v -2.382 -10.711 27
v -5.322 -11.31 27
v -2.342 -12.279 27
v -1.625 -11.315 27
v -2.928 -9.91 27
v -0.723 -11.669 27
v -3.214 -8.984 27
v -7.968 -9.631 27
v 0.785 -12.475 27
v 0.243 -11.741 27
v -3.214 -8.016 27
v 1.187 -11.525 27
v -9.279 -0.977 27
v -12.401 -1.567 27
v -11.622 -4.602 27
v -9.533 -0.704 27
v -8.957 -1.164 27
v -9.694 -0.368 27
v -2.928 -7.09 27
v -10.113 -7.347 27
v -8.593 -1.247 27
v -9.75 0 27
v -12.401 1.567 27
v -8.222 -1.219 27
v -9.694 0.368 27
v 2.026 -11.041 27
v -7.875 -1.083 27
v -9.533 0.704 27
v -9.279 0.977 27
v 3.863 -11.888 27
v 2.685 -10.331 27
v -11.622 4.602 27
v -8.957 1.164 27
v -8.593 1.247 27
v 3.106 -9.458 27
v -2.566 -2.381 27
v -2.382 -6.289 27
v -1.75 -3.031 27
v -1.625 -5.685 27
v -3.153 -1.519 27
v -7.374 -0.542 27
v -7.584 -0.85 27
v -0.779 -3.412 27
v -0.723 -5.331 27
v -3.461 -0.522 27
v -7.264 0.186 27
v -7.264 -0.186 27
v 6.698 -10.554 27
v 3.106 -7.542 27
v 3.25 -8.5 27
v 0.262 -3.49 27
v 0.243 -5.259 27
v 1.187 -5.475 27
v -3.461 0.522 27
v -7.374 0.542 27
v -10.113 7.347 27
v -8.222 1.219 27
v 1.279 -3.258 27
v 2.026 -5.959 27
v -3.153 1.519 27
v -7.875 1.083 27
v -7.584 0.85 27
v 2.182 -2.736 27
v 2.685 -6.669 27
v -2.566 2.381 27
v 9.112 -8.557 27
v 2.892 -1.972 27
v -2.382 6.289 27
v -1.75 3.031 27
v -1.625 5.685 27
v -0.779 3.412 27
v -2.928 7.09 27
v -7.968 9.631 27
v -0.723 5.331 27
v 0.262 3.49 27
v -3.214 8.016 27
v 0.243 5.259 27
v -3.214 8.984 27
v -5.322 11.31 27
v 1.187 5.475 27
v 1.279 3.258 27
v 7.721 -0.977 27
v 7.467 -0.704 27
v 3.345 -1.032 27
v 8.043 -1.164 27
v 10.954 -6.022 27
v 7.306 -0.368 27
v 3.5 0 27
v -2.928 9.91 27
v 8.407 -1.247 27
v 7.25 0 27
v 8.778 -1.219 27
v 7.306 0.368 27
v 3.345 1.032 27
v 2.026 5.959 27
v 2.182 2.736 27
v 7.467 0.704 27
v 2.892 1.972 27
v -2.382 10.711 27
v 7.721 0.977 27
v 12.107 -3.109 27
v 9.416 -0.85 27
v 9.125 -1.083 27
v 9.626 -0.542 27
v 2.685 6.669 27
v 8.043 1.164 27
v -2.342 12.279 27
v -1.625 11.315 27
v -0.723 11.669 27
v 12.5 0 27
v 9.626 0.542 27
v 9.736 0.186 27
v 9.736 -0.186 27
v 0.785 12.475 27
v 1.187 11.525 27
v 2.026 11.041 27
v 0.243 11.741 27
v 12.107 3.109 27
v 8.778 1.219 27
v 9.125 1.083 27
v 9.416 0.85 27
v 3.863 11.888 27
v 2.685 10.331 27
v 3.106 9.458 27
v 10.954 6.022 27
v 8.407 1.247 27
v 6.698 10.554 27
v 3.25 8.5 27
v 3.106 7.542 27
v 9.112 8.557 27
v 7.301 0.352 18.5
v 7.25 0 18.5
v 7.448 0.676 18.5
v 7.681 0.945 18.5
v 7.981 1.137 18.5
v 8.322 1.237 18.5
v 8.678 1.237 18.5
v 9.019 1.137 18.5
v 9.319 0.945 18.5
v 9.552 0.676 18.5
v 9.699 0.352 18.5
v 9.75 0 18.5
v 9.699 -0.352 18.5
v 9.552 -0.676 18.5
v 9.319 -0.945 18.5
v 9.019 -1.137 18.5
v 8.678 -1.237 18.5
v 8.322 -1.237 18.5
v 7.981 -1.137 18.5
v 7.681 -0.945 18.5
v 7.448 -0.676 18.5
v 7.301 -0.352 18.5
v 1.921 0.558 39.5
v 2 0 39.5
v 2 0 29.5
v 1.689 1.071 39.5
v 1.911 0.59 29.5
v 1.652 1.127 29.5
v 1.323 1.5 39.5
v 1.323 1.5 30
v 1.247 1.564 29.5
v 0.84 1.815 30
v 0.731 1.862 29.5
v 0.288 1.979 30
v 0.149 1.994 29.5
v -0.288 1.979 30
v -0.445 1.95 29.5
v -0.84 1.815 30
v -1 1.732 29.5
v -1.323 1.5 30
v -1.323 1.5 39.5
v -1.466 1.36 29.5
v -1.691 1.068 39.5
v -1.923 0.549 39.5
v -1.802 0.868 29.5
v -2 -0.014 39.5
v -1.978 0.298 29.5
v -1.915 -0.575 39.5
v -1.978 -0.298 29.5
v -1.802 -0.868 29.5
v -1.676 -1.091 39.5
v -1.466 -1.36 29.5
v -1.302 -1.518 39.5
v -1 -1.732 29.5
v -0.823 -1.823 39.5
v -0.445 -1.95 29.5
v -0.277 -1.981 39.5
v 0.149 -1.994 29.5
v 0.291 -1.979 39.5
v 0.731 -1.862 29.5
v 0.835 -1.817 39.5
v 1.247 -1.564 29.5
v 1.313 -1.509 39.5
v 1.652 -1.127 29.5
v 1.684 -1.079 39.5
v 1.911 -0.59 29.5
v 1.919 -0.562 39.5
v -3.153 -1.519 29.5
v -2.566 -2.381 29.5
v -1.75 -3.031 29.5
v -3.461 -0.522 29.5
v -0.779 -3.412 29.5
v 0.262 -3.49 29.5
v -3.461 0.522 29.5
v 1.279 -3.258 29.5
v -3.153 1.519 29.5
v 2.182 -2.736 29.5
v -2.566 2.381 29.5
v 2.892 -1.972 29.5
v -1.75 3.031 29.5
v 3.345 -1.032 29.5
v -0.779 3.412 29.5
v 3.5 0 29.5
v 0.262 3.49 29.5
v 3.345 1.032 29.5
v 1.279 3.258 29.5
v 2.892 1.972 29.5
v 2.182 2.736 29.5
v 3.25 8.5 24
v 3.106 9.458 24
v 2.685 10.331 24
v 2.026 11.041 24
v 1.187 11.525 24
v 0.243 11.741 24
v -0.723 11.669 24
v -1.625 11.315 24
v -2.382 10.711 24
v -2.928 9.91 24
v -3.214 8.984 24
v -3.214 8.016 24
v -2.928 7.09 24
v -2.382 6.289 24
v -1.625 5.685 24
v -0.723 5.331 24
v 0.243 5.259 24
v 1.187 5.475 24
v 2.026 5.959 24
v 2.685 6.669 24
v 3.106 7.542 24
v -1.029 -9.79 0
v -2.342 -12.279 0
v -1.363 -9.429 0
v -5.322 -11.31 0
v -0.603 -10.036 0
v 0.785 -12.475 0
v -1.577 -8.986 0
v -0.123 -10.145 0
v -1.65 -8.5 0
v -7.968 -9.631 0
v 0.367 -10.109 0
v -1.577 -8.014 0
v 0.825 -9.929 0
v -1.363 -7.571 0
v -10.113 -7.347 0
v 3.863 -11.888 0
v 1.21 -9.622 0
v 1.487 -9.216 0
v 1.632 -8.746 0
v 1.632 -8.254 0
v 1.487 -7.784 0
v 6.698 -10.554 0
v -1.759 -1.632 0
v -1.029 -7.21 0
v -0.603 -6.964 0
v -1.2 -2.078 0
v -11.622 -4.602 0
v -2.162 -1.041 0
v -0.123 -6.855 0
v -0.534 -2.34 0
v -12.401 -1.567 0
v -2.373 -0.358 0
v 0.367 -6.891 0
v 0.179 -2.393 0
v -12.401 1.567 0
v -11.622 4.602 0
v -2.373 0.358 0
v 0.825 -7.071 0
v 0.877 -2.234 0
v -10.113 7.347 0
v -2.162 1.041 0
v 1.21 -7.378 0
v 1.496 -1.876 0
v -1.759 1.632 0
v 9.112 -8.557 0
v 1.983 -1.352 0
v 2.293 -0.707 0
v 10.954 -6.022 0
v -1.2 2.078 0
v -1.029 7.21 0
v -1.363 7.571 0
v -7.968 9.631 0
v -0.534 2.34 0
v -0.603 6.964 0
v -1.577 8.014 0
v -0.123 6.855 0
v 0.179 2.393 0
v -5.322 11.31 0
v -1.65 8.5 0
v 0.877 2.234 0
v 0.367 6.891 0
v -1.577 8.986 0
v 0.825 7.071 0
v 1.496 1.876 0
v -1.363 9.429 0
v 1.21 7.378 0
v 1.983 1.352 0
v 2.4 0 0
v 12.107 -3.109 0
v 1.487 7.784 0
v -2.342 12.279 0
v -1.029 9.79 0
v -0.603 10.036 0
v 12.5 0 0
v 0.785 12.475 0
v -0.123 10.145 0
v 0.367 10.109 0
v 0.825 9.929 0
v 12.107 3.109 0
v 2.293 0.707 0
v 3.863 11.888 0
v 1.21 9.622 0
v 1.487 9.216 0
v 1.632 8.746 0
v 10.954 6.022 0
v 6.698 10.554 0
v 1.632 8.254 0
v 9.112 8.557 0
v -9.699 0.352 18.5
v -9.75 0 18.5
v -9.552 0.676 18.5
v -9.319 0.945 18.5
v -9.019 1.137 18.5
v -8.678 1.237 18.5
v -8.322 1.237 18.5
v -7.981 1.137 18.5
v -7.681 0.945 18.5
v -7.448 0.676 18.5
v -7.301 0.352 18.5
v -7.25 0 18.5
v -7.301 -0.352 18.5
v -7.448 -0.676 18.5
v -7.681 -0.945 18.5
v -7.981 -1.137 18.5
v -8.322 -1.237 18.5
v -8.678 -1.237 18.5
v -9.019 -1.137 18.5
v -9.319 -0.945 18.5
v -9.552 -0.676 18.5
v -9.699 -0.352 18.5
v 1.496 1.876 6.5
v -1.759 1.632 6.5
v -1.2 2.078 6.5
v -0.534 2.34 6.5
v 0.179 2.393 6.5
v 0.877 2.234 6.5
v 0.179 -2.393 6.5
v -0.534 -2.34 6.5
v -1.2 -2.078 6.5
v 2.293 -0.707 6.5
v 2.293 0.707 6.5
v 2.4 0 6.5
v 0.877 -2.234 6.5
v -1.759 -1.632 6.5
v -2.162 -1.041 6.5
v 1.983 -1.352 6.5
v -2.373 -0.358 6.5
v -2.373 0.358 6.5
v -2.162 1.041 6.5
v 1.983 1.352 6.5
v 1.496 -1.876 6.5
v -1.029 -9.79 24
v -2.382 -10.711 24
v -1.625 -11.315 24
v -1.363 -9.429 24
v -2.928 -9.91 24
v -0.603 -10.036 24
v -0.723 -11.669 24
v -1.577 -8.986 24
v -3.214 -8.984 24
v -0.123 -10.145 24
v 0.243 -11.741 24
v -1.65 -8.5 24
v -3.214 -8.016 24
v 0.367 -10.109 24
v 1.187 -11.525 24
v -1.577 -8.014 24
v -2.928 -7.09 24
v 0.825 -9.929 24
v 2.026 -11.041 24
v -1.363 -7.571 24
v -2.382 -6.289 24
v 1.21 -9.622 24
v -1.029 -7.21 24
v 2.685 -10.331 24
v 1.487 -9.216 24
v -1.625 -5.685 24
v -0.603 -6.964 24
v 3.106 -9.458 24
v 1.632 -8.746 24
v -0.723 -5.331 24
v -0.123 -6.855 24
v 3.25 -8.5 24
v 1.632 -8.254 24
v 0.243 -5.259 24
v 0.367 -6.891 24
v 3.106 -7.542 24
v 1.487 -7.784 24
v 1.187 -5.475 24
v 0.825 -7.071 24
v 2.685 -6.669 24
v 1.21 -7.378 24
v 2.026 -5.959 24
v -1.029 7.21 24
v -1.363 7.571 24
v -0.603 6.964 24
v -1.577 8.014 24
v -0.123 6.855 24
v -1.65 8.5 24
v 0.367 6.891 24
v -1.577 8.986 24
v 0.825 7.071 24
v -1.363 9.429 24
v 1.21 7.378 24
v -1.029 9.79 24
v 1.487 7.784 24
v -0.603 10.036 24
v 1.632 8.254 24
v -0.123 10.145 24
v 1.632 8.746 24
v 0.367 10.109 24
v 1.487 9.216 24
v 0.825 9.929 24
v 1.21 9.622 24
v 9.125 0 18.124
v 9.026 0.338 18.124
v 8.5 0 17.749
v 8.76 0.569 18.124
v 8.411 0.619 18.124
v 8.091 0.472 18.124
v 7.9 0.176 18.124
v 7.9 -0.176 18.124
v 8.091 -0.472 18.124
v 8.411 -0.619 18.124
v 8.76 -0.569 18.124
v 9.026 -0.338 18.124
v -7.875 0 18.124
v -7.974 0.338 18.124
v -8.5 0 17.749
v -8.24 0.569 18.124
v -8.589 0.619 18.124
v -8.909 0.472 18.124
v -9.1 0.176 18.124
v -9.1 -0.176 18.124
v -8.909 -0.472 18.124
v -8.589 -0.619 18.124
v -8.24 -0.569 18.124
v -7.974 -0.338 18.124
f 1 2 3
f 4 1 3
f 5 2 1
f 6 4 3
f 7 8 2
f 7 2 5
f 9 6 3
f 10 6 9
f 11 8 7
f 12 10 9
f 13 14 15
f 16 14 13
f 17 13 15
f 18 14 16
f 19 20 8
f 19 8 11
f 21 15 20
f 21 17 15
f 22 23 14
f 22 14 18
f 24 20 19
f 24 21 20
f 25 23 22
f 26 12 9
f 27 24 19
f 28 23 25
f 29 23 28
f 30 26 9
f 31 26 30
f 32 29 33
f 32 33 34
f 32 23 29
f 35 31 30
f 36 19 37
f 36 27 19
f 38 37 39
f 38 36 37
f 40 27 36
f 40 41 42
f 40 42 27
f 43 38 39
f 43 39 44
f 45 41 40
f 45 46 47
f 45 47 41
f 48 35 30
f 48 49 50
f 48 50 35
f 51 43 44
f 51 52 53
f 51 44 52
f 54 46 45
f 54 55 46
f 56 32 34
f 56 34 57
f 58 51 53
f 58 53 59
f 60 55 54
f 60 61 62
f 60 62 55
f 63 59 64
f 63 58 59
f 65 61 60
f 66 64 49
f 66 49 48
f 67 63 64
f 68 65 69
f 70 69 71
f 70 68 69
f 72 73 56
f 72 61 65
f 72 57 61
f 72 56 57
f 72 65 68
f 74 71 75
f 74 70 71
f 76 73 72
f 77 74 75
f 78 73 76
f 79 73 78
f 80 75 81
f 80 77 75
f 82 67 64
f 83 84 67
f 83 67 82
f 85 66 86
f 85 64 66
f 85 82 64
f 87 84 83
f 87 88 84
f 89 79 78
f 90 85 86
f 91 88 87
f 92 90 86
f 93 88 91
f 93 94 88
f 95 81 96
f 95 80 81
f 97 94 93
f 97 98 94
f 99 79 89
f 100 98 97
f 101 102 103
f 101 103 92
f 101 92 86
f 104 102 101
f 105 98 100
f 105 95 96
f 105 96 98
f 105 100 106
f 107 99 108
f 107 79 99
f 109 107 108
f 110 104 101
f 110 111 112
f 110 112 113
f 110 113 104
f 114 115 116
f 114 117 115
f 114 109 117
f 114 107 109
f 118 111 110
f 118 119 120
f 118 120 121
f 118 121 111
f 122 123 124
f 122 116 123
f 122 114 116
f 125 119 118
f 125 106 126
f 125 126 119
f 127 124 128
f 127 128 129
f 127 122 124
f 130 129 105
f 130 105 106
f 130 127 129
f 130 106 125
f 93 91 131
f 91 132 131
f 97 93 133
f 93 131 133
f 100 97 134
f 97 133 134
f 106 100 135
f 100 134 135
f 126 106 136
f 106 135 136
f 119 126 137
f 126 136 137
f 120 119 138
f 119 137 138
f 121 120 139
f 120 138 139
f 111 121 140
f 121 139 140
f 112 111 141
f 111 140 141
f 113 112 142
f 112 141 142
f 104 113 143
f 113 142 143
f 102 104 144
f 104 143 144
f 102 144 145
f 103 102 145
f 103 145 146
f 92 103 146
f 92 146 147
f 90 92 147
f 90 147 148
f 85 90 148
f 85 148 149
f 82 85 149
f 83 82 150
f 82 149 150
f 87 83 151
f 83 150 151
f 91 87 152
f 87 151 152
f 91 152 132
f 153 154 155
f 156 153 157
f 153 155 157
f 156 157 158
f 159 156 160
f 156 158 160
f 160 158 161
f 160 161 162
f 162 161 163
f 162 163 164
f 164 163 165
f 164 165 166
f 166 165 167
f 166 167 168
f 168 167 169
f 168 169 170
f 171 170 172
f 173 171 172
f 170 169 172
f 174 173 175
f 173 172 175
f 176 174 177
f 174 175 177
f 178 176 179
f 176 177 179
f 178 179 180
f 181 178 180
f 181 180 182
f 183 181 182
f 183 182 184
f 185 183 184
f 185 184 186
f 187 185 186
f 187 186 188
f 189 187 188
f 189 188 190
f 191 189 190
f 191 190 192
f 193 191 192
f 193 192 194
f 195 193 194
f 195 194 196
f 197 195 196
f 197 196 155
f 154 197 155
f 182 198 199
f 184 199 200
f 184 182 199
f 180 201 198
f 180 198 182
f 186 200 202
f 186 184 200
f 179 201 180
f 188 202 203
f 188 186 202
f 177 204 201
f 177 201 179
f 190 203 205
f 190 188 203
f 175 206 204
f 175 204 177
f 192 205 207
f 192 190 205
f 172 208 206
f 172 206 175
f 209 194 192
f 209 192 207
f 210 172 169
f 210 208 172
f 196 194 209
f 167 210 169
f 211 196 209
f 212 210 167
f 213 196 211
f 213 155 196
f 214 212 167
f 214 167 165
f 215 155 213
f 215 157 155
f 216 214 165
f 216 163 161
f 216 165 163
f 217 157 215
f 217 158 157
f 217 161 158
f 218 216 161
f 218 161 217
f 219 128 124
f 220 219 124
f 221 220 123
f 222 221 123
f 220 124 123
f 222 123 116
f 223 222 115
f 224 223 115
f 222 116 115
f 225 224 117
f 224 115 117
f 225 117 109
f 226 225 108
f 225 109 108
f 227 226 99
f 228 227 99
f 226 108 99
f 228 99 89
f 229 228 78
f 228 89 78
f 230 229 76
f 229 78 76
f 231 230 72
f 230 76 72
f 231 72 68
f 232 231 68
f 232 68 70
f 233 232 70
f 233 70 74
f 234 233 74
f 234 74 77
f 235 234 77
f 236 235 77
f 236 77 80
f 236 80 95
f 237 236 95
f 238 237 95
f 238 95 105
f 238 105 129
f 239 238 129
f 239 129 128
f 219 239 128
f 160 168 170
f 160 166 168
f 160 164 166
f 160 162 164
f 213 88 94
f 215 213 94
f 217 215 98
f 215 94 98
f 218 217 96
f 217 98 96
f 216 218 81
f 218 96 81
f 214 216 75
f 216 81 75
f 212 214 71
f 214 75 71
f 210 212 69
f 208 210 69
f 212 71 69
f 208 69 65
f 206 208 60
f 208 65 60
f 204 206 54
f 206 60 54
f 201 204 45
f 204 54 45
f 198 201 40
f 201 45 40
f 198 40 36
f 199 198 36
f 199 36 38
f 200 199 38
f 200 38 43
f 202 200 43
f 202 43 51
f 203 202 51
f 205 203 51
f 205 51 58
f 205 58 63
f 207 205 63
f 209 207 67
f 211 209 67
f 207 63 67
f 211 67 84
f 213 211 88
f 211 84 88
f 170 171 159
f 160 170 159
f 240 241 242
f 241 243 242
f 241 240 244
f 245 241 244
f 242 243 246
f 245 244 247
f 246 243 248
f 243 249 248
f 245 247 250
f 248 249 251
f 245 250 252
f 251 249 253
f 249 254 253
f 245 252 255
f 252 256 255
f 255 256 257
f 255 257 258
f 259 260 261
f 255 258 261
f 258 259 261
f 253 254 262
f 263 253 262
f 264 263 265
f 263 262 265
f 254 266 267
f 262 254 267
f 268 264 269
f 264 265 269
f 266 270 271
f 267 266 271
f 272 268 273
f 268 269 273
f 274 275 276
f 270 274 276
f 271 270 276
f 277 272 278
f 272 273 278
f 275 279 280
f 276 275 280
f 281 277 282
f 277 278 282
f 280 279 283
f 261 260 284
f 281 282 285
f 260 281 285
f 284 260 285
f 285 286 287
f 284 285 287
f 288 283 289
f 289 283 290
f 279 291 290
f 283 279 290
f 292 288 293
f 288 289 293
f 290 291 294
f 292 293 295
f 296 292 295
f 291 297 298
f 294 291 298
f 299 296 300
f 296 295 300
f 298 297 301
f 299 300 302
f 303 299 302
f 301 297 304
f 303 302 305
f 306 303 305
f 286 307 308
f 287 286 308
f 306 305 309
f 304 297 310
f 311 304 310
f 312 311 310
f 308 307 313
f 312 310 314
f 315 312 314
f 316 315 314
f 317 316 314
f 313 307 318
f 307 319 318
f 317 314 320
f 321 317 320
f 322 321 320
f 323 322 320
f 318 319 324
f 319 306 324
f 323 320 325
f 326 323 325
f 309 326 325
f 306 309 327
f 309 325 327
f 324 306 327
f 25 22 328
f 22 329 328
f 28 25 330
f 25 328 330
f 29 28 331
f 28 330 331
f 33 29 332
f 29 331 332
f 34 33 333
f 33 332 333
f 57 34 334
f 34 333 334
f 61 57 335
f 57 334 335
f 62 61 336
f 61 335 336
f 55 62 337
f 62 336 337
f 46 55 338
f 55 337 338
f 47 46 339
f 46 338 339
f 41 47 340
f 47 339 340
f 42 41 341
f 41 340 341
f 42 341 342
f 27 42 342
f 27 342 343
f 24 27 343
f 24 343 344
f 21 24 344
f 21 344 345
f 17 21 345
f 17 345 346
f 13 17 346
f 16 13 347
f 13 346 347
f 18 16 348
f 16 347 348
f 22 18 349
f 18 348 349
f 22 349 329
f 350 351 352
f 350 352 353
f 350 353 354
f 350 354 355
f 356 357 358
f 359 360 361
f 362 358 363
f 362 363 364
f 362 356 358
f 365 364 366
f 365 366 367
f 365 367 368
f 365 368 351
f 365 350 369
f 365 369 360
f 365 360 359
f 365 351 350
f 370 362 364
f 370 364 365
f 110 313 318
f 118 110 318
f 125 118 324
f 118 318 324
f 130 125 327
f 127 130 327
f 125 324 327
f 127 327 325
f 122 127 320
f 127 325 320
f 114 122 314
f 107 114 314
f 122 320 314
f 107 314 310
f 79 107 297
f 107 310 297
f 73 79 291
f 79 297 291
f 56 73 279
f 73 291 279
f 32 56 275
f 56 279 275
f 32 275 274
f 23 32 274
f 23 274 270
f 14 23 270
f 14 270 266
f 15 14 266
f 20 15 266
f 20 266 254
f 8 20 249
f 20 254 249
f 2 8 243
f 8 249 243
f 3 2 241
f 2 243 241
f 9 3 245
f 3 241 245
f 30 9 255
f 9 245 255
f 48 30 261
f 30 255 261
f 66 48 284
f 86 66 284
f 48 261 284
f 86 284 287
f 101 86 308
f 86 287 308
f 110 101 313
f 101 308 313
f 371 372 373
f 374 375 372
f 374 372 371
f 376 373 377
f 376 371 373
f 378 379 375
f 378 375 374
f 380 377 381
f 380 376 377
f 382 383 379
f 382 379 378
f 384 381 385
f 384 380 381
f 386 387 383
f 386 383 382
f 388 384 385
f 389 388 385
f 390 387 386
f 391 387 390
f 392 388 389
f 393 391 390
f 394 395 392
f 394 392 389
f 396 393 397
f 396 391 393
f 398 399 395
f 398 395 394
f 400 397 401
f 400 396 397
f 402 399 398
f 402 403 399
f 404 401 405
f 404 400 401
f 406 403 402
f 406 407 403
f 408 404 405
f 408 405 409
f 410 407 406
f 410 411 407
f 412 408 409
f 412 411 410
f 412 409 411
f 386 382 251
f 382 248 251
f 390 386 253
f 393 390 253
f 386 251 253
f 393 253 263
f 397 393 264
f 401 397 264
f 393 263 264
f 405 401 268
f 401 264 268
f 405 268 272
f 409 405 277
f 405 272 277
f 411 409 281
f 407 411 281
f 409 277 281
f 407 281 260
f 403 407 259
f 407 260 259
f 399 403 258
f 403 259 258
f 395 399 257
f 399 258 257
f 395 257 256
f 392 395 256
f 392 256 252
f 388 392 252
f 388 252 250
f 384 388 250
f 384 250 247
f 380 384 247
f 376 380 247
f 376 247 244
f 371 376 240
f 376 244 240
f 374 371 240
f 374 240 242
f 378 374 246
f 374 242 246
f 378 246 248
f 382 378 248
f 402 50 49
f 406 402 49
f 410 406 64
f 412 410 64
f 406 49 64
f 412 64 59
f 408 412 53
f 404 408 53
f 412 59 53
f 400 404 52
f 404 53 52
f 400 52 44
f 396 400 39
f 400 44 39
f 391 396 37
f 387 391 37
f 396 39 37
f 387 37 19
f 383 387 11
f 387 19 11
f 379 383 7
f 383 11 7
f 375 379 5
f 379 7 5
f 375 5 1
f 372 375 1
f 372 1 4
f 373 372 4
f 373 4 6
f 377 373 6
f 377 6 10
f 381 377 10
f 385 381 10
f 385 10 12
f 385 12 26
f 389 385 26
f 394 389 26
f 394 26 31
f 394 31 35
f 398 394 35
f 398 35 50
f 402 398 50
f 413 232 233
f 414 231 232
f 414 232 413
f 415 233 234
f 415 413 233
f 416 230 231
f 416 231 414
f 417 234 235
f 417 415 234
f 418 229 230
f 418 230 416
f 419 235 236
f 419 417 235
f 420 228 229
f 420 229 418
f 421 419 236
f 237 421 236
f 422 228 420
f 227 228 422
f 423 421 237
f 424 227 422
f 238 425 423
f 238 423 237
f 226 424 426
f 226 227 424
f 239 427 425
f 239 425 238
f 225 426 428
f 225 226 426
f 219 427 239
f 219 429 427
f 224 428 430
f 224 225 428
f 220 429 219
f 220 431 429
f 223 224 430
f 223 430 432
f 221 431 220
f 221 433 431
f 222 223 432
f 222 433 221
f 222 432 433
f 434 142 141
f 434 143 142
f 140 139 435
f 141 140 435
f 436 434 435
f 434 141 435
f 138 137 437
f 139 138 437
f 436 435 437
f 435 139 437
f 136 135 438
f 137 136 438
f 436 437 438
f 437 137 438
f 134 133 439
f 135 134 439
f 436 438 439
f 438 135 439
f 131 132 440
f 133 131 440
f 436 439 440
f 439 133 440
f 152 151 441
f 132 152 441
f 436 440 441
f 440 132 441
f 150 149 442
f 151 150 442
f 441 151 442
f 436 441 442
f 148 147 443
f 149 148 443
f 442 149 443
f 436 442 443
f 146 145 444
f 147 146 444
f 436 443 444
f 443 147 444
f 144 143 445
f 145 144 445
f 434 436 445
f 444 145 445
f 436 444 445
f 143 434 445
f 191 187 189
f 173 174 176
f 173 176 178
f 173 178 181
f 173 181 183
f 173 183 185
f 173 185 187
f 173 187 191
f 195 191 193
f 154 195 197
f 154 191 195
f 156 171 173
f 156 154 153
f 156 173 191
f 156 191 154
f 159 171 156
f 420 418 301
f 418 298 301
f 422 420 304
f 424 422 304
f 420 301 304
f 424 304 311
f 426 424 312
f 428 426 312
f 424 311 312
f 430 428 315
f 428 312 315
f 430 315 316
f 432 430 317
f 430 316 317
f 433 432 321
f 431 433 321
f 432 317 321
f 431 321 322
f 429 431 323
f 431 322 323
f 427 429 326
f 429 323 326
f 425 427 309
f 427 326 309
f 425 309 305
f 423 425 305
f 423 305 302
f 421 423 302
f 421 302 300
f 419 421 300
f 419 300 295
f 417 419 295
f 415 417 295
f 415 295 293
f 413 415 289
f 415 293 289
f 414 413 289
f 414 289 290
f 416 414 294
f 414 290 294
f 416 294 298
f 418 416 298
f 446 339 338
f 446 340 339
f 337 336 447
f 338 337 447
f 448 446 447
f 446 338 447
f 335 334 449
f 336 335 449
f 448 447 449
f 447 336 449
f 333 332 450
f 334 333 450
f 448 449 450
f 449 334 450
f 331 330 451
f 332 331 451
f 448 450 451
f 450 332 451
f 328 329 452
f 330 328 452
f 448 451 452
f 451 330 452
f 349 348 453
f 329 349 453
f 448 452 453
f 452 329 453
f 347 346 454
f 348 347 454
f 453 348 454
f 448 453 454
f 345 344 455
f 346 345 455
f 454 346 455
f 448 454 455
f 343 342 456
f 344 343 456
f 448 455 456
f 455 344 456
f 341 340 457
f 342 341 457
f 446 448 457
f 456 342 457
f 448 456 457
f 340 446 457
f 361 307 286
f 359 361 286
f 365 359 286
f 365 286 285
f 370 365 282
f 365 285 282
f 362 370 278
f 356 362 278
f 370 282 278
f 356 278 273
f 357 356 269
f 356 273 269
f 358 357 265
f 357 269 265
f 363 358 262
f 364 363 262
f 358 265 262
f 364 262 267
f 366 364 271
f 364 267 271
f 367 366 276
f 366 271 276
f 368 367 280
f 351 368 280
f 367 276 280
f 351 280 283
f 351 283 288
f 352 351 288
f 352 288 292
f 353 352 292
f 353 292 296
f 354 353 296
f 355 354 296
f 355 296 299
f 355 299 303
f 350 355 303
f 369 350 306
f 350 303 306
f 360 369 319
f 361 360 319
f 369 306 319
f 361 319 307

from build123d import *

# Parameters (mm, degrees)
F0_R           = 12.5
F1_DEPTH       = 27
F2_R           = 3.5
F3_DEPTH       = 2.5
F4_R           = 2
F5_DEPTH       = 10
F7_D           = 2.5
F7_DEPTH       = 8.5
F7_TIP         = 0.7510757738
F8_D           = 3.3
F8_CBORE_D     = 6.5
F8_CBORE_DEPTH = 3
F9_R           = 2.4
F10_DEPTH      = 6.5
F11_W          = 2.6457513111
F11_H          = 0.5
F12_DEPTH      = 9.5


with BuildPart() as f1:
    # F0 (on Top) → F1 (new body)
    with BuildSketch(Plane.XY):
        Circle(F0_R)
    extrude(amount=F1_DEPTH)

    # F2 (on face) → F3 (join)
    with BuildSketch(Plane.XY.offset(27)):
        Circle(F2_R)
    extrude(amount=F3_DEPTH)

    # F4 (on face) → F5 (join)
    with BuildSketch(Plane.XY.offset(29.5)):
        Circle(F4_R)
    extrude(amount=F5_DEPTH)

    # F7
    with Locations(Plane.XY.offset(27)):
        with Locations((-8.5, 0), (8.5, 0)):
            Hole(F7_D / 2, depth=F7_DEPTH)
            with Locations((0, 0, -(F7_DEPTH + F7_TIP / 2))):  # 118° drill point
                Cone(0, F7_D / 2, F7_TIP, mode=Mode.SUBTRACT)

    # F8 (through all)
    with Locations(Plane.XY.offset(27)):
        with Locations((0, 8.5), (0, -8.5)):
            CounterBoreHole(F8_D / 2, F8_CBORE_D / 2, F8_CBORE_DEPTH)

    # F9 (on face) → F10 (cut)
    with BuildSketch(Plane(origin=(0, 0, 0), x_dir=(1, 0, 0), z_dir=(0, 0, -1))):
        Circle(F9_R)
    extrude(amount=-F10_DEPTH, mode=Mode.SUBTRACT)

    # F11 (on face) → F12 (cut)
    with BuildSketch(Plane.XY.offset(39.5)):
        with Locations((0, 1.75)):
            Rectangle(F11_W, F11_H)
    extrude(amount=-F12_DEPTH, mode=Mode.SUBTRACT)


solid = f1.part
